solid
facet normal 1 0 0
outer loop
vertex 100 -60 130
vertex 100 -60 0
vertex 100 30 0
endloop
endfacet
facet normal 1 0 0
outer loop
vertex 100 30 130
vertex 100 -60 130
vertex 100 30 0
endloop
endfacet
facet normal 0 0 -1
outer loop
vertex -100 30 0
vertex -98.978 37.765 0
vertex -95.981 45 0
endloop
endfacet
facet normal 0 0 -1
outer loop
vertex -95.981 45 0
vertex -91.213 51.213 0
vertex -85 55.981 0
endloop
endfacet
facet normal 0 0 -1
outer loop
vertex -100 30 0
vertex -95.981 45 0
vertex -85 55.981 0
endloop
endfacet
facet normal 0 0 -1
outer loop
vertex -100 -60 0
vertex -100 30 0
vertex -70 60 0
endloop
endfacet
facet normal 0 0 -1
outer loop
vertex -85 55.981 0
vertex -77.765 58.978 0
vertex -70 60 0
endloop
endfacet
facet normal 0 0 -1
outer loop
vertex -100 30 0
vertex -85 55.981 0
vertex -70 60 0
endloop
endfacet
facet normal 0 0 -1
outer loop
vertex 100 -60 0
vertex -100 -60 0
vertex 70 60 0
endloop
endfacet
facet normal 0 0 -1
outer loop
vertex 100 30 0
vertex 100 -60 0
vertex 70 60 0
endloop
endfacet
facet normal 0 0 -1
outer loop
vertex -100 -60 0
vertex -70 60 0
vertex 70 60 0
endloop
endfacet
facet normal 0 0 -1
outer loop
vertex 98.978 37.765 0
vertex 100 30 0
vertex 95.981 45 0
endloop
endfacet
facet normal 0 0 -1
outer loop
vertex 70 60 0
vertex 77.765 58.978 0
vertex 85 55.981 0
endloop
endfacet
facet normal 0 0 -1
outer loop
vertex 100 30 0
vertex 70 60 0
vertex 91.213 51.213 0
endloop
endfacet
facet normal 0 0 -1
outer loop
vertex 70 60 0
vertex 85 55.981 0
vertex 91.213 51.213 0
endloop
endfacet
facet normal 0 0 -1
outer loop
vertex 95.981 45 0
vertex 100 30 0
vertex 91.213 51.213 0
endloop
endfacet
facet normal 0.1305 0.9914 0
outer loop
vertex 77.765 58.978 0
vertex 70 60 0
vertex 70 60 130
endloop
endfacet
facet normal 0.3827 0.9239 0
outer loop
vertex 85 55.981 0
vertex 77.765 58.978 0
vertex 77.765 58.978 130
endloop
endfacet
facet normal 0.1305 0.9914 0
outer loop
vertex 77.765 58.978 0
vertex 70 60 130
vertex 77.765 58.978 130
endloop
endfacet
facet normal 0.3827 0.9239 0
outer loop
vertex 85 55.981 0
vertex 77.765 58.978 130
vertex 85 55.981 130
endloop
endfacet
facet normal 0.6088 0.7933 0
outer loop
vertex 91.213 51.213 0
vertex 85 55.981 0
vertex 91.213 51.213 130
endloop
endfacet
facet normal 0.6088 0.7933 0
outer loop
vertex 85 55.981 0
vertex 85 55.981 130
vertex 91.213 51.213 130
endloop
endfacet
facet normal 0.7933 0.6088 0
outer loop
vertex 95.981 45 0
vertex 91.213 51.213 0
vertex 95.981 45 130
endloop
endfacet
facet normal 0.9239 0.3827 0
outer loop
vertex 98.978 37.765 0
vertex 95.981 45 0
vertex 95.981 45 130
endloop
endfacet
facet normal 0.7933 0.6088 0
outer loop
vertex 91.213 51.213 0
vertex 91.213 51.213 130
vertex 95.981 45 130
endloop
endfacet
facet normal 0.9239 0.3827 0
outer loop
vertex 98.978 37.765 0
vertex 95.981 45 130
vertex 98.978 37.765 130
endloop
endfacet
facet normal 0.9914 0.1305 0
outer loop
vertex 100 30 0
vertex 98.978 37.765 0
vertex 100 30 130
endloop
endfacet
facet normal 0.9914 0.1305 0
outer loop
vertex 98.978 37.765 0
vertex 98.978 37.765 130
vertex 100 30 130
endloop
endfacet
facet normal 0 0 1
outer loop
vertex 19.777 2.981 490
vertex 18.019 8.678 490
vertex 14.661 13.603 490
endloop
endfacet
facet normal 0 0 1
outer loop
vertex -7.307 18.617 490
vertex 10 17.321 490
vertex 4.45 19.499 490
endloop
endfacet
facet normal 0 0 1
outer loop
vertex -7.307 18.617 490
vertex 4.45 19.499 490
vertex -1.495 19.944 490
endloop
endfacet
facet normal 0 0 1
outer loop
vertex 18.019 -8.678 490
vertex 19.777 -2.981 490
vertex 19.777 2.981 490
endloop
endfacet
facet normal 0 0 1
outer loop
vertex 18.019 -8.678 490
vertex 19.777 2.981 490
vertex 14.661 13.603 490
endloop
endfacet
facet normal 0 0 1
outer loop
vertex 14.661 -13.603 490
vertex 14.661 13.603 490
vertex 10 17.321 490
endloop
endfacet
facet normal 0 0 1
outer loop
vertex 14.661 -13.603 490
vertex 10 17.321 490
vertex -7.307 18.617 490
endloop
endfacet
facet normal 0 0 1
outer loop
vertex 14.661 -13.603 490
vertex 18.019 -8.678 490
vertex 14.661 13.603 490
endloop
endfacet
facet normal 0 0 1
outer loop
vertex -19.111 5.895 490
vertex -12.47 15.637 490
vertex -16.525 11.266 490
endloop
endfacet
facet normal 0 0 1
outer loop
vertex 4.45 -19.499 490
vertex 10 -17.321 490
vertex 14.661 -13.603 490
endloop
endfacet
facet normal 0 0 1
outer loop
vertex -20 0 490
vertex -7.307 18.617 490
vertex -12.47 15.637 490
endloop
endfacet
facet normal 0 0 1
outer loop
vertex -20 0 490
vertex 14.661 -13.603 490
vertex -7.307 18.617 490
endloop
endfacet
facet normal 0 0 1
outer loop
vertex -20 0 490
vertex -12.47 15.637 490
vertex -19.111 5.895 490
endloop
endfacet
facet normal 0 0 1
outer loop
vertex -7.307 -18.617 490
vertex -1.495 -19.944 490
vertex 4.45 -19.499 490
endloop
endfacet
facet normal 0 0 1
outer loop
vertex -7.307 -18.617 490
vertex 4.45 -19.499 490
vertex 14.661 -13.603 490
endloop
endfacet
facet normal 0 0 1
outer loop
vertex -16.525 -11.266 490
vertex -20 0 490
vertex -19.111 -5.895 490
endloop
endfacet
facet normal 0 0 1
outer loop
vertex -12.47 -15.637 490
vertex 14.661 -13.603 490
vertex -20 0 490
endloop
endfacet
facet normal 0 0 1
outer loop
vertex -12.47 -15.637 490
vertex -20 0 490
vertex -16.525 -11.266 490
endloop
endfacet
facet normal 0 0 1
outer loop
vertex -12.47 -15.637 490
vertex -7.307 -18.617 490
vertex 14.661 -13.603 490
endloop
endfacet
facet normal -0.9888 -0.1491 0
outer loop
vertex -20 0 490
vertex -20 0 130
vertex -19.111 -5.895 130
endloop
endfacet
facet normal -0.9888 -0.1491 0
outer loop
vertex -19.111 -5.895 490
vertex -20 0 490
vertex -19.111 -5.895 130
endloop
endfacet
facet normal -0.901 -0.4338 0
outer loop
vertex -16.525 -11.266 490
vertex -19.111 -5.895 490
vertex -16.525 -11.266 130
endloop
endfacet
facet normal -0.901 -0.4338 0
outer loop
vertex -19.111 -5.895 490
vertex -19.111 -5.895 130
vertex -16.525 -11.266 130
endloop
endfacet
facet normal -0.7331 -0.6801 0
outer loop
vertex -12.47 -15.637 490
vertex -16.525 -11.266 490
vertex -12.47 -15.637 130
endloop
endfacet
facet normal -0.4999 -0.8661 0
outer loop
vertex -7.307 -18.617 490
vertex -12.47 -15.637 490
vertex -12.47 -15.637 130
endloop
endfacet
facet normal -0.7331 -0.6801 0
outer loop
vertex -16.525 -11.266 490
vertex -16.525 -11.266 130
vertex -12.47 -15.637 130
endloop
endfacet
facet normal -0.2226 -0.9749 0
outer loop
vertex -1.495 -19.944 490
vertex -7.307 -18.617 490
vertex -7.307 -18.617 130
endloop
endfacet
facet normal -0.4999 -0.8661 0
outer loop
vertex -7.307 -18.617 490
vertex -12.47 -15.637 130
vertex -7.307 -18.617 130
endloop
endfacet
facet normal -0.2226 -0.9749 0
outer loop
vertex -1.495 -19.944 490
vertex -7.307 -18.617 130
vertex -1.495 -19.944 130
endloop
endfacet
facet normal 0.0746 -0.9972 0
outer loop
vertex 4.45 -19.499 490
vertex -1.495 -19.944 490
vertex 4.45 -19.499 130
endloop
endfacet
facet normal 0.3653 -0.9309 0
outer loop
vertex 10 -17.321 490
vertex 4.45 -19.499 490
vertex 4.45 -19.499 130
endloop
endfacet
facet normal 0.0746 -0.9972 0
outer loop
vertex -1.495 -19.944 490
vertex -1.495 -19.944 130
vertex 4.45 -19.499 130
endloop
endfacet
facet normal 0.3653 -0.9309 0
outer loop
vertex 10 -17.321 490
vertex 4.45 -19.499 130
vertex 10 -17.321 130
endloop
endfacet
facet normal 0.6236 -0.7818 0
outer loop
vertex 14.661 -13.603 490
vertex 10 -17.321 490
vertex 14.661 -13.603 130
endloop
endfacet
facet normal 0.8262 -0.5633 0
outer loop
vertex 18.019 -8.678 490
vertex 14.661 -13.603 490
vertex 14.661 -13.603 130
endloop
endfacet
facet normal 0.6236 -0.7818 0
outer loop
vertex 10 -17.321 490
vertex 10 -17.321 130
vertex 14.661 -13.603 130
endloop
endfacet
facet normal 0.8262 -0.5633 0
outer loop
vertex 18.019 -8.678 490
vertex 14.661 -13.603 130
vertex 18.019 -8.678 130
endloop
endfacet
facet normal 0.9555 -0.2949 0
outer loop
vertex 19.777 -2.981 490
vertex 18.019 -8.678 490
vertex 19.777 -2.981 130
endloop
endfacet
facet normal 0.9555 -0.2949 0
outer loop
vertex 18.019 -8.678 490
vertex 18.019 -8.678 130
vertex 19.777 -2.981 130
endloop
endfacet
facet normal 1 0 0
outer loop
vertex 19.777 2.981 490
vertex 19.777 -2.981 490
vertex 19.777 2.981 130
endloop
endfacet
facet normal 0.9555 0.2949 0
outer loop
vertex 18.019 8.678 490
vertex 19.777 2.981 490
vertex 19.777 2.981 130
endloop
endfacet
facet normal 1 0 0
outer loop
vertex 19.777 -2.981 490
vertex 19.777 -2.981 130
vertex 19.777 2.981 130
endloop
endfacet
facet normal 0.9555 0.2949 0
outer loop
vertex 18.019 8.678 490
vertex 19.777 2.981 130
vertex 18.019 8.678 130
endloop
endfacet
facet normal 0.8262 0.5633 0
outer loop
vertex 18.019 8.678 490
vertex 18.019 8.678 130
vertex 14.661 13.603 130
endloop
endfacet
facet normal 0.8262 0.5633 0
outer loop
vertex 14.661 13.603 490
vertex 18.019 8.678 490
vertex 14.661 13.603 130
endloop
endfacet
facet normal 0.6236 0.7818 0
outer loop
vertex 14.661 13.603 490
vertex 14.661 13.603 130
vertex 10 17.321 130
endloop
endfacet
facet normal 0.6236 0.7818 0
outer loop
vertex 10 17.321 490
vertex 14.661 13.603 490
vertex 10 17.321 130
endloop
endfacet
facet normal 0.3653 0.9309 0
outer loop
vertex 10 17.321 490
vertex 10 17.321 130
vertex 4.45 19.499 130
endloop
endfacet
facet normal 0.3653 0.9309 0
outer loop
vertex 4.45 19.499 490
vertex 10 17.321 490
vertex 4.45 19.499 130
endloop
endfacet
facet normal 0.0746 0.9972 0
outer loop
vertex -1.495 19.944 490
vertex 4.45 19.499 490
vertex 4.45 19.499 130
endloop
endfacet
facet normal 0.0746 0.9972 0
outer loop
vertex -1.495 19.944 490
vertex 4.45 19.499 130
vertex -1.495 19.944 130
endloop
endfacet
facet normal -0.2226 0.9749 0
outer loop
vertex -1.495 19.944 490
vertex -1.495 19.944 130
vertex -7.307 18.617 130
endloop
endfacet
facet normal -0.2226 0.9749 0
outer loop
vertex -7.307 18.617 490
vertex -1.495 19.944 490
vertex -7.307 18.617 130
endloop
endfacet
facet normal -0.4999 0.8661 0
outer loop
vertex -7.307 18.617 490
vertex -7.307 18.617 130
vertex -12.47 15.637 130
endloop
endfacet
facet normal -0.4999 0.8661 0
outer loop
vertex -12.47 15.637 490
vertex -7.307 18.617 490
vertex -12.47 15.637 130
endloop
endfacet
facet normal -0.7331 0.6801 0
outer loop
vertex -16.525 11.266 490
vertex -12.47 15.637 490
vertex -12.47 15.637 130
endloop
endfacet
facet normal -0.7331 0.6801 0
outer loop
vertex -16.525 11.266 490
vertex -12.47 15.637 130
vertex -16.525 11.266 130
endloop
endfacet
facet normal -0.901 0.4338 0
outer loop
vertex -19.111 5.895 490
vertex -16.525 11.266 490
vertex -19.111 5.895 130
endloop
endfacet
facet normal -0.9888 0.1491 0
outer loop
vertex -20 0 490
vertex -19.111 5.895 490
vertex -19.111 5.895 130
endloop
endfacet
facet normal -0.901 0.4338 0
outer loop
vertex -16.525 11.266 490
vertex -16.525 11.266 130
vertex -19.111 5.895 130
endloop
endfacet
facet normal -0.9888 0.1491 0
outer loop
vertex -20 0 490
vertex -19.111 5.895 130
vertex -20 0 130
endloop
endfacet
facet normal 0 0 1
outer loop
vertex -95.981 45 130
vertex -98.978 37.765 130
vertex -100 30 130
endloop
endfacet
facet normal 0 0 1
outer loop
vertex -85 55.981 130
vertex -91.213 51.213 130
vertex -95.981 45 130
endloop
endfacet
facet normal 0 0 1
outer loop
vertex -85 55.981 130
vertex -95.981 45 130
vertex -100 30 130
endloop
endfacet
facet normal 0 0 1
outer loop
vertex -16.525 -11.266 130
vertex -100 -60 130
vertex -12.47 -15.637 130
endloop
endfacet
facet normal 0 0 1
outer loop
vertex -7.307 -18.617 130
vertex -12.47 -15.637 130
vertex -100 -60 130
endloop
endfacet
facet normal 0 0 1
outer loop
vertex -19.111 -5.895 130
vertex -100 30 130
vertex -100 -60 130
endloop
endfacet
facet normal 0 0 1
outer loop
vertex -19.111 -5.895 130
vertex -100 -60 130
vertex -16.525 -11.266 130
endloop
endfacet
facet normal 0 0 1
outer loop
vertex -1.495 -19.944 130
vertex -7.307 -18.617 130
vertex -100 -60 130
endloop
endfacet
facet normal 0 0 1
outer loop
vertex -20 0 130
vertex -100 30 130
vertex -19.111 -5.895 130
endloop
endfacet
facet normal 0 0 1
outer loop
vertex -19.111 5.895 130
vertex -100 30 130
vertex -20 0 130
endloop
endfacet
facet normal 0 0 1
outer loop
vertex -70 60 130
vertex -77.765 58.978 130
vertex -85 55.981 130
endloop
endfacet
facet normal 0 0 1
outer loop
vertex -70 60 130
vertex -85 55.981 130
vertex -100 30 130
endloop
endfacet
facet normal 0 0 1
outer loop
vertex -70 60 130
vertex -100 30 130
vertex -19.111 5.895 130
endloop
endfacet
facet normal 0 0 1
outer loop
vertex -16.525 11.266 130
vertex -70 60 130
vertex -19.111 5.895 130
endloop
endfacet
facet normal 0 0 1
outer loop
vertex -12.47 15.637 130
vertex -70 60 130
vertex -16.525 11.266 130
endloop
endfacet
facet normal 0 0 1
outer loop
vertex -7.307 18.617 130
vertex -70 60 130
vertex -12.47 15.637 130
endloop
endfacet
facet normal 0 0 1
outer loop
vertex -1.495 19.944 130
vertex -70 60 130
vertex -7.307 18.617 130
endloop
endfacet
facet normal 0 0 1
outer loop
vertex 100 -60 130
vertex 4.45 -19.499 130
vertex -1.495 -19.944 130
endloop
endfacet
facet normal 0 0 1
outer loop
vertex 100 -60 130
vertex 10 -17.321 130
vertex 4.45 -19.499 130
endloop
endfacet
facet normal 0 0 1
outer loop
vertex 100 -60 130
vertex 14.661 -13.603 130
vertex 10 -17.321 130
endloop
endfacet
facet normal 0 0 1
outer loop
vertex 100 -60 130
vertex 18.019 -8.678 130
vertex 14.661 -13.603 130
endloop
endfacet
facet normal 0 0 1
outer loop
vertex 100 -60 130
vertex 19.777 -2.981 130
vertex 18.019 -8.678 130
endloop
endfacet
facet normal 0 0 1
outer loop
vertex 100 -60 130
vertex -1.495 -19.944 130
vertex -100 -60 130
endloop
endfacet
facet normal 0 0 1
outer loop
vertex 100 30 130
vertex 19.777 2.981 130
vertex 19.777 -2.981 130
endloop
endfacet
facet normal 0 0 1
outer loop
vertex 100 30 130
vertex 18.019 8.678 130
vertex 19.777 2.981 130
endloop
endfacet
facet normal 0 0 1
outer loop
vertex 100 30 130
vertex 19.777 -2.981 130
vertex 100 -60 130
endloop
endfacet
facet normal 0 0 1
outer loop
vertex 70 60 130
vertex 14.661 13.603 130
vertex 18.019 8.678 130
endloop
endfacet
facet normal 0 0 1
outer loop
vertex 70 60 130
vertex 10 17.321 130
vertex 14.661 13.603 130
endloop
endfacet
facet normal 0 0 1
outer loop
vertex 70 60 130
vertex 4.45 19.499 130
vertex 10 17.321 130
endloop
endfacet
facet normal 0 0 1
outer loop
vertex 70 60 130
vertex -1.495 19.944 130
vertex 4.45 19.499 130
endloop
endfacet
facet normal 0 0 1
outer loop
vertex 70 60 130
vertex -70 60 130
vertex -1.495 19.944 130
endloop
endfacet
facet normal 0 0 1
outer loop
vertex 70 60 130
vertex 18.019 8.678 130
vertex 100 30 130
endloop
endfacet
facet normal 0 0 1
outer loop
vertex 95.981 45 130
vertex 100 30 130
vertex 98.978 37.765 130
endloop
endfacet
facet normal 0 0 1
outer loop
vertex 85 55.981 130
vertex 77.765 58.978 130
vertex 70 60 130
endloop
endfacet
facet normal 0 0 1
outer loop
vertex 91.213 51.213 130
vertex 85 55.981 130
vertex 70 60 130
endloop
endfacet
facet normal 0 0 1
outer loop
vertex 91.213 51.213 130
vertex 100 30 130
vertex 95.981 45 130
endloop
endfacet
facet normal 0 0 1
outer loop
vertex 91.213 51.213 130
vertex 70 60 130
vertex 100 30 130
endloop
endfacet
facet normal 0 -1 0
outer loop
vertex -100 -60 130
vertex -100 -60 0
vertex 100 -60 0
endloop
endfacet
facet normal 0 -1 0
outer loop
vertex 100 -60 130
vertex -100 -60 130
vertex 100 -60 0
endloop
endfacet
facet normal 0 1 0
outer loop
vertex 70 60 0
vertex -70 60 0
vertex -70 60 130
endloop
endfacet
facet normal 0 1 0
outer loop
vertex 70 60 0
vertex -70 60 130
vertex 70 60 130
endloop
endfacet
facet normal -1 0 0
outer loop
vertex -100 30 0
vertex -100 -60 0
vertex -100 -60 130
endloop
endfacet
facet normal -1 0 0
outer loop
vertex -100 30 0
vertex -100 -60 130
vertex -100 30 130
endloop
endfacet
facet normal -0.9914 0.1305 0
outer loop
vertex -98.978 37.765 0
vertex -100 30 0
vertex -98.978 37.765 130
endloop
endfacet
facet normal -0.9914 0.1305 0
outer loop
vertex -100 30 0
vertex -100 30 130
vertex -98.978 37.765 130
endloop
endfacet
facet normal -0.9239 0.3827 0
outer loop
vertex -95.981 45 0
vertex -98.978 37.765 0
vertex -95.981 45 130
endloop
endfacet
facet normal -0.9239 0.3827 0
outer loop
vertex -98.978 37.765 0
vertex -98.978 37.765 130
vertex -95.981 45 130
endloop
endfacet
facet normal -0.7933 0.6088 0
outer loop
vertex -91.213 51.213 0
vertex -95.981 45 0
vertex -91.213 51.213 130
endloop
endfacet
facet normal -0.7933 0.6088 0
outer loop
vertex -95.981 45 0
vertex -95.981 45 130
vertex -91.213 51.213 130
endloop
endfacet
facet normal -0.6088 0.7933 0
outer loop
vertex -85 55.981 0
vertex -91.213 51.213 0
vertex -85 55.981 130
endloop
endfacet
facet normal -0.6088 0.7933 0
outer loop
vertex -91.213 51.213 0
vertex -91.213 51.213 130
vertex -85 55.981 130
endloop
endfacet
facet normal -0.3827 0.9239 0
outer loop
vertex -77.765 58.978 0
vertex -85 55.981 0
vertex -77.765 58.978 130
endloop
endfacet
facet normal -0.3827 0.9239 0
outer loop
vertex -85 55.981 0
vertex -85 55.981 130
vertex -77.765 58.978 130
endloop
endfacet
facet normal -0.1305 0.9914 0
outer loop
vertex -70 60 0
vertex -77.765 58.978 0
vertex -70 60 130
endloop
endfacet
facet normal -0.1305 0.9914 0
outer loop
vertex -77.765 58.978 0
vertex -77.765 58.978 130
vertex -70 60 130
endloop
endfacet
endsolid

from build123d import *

# Parameters (mm, degrees)
SKIZZE1_W                       = 200
SKIZZE1_H                       = 120
AUFSATZ_LINEAR_AUSTRAGEN1_DEPTH = 130
SKIZZE2_R                       = 20
AUFSATZ_LINEAR_AUSTRAGEN2_DEPTH = 360
VERRUNDUNG1_R                   = 30


with BuildPart() as part:
    # Skizze1 → Aufsatz-Linear austragen1 (new body)
    with BuildSketch(Plane.XY):
        Rectangle(SKIZZE1_W, SKIZZE1_H)
    extrude(amount=AUFSATZ_LINEAR_AUSTRAGEN1_DEPTH)

    # Skizze2 → Aufsatz-Linear austragen2 (add)
    with BuildSketch(Plane.XY.offset(130)):
        with Locations(Location((0, 0, 0), (0, 0, 180))):
            Circle(SKIZZE2_R)
    extrude(amount=AUFSATZ_LINEAR_AUSTRAGEN2_DEPTH)

    # Verrundung1
    verrundung1_edges = [part.edges().sort_by_distance(p)[0] for p in [
        (-100, 60, 65),
        (100, 60, 65),
    ]]
    fillet(verrundung1_edges, radius=VERRUNDUNG1_R)


solid = part.part
